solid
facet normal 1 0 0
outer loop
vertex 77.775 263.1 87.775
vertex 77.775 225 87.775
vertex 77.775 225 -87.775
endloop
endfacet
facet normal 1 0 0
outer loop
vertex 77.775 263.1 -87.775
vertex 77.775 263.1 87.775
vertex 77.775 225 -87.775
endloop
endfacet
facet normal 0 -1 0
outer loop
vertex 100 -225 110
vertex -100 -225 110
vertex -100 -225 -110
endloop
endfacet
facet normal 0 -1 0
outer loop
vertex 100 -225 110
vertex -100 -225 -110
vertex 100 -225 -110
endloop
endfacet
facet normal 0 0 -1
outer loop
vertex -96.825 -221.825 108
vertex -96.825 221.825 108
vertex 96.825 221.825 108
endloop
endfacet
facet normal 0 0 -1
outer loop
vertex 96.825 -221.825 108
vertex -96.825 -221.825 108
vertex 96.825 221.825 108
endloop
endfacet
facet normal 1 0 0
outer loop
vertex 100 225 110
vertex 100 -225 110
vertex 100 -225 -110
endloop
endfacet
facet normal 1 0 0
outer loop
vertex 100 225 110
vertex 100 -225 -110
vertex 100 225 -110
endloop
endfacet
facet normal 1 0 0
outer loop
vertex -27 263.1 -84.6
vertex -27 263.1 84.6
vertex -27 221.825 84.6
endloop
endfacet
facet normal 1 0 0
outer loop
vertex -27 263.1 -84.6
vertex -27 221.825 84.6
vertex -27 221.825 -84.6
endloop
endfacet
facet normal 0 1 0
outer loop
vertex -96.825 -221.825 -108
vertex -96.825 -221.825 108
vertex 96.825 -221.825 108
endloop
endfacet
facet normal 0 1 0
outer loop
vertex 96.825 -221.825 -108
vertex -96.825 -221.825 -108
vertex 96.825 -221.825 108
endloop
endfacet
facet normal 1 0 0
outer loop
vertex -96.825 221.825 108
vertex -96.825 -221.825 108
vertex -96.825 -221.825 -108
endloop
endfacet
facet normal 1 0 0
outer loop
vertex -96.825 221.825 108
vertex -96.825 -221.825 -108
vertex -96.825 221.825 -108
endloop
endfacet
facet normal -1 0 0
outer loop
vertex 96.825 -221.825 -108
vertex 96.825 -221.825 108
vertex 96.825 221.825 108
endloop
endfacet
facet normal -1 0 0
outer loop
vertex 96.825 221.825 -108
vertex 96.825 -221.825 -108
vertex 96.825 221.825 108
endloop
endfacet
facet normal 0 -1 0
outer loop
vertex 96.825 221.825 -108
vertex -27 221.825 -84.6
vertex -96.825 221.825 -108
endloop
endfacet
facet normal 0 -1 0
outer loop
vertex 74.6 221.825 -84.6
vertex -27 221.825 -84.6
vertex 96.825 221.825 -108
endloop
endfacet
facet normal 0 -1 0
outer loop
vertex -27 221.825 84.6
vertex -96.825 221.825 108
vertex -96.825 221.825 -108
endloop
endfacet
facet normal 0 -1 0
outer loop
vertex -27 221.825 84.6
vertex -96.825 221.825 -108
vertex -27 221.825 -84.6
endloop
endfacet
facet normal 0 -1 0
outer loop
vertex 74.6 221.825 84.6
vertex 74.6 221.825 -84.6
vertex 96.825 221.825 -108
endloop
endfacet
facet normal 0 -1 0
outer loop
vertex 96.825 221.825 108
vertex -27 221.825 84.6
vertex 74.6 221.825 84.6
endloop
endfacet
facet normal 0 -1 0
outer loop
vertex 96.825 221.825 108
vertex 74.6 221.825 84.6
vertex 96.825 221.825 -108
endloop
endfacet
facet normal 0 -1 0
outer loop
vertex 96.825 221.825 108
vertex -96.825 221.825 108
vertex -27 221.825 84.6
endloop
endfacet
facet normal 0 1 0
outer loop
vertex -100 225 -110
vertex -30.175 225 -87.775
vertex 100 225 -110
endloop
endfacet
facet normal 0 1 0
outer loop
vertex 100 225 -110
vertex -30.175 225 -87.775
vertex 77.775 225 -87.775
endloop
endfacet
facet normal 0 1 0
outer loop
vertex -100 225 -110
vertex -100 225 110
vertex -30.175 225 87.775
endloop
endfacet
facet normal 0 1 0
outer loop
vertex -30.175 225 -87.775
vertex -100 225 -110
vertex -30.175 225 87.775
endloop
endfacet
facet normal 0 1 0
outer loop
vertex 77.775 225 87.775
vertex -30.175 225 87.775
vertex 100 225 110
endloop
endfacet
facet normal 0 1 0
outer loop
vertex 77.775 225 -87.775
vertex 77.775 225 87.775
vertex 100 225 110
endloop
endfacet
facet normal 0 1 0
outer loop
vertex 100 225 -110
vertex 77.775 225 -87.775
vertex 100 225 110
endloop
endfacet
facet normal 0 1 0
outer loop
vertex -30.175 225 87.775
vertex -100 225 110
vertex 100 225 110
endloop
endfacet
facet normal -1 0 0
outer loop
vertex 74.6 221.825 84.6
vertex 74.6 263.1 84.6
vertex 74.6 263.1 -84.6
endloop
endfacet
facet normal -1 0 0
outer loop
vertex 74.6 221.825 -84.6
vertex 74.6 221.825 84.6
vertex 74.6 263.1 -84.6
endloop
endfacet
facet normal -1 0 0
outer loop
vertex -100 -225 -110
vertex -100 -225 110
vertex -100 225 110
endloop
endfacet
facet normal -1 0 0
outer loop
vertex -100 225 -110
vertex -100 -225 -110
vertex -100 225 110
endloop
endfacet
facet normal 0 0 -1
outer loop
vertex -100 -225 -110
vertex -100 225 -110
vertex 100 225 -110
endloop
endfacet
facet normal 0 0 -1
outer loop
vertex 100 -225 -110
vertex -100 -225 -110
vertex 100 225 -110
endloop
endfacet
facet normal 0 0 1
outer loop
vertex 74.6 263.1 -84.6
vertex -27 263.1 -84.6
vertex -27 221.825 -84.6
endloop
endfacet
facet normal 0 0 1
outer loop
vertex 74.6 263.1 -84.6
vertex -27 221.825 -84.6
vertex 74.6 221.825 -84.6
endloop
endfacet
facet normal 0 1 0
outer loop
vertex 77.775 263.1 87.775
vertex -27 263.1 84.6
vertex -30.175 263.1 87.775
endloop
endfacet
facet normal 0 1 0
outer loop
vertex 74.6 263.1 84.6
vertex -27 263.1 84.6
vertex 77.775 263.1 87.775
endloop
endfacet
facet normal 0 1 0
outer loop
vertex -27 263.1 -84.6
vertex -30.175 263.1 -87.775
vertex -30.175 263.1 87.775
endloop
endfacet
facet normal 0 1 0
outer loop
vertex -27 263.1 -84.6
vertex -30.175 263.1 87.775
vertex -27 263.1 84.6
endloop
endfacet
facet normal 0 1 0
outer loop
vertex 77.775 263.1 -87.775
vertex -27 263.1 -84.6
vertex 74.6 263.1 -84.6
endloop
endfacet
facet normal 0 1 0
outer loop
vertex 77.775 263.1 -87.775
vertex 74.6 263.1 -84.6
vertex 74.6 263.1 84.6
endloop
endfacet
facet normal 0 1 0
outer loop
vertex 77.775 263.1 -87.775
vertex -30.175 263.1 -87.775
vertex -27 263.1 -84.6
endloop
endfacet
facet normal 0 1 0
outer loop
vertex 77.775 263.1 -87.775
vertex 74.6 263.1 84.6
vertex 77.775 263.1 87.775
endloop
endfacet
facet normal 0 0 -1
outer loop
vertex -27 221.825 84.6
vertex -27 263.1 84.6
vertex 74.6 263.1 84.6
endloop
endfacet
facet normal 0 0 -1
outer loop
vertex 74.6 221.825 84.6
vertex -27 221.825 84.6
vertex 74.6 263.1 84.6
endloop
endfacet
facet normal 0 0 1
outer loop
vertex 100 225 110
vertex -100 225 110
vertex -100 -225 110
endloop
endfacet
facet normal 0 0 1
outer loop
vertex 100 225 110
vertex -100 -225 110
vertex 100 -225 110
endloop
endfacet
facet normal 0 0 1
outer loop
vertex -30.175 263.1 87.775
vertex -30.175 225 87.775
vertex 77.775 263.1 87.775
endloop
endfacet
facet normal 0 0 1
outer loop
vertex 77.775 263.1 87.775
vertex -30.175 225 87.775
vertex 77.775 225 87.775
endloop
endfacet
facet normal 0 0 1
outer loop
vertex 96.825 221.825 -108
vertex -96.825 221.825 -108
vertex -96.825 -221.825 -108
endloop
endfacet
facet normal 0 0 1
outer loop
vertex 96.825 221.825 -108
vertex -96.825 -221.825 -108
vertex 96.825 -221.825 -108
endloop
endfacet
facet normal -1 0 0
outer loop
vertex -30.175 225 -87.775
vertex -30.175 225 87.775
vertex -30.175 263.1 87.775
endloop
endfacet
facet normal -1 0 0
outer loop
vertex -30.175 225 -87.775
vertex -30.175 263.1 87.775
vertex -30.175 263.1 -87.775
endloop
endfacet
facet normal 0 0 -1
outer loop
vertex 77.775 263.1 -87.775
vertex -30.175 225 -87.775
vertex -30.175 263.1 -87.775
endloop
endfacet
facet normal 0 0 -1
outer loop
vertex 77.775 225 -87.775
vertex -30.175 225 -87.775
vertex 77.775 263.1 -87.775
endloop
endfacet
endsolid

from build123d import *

# Parameters (mm, degrees)
ESQUISSE2_W             = 200
ESQUISSE2_H             = 450
BOSS_EXTRU_1_DEPTH      = 110
ESQUISSE3_W             = 193.65
ESQUISSE3_H             = 443.65
ENL_V_MAT_EXTRU_1_DEPTH = 108
ESQUISSE5_W             = 107.95
ESQUISSE5_H             = 175.55
BOSS_EXTRU_2_DEPTH      = 38.1
ESQUISSE4_W             = 101.6
ESQUISSE4_H             = 169.2
ENL_V_MAT_EXTRU_2_DEPTH = 41.275


with BuildPart() as part:
    # Esquisse2 → Boss.-Extru.1 (new, symmetric)
    with BuildSketch(Plane.XY):
        Rectangle(ESQUISSE2_W, ESQUISSE2_H)
    extrude(amount=BOSS_EXTRU_1_DEPTH, both=True)

    # Esquisse3 → Enlèv. mat.-Extru.1 (cut, symmetric)
    with BuildSketch(Plane.XY):
        Rectangle(ESQUISSE3_W, ESQUISSE3_H)
    extrude(amount=ENL_V_MAT_EXTRU_1_DEPTH, both=True, mode=Mode.SUBTRACT)

    # Esquisse5 → Boss.-Extru.2 (add)
    with BuildSketch(Plane(origin=(0, 225, 0), x_dir=(1, 0, 0), z_dir=(0, 1, 0))):
        with Locations((23.8, 0)):
            Rectangle(ESQUISSE5_W, ESQUISSE5_H)
    extrude(amount=BOSS_EXTRU_2_DEPTH)

    # Esquisse4 → Enlèv. mat.-Extru.2 (cut)
    with BuildSketch(Plane(origin=(0, 263.1, 0), x_dir=(1, 0, 0), z_dir=(0, 1, 0))):
        with Locations((23.8, 0)):
            Rectangle(ESQUISSE4_W, ESQUISSE4_H)
    extrude(amount=-ENL_V_MAT_EXTRU_2_DEPTH, mode=Mode.SUBTRACT)


solid = part.part
